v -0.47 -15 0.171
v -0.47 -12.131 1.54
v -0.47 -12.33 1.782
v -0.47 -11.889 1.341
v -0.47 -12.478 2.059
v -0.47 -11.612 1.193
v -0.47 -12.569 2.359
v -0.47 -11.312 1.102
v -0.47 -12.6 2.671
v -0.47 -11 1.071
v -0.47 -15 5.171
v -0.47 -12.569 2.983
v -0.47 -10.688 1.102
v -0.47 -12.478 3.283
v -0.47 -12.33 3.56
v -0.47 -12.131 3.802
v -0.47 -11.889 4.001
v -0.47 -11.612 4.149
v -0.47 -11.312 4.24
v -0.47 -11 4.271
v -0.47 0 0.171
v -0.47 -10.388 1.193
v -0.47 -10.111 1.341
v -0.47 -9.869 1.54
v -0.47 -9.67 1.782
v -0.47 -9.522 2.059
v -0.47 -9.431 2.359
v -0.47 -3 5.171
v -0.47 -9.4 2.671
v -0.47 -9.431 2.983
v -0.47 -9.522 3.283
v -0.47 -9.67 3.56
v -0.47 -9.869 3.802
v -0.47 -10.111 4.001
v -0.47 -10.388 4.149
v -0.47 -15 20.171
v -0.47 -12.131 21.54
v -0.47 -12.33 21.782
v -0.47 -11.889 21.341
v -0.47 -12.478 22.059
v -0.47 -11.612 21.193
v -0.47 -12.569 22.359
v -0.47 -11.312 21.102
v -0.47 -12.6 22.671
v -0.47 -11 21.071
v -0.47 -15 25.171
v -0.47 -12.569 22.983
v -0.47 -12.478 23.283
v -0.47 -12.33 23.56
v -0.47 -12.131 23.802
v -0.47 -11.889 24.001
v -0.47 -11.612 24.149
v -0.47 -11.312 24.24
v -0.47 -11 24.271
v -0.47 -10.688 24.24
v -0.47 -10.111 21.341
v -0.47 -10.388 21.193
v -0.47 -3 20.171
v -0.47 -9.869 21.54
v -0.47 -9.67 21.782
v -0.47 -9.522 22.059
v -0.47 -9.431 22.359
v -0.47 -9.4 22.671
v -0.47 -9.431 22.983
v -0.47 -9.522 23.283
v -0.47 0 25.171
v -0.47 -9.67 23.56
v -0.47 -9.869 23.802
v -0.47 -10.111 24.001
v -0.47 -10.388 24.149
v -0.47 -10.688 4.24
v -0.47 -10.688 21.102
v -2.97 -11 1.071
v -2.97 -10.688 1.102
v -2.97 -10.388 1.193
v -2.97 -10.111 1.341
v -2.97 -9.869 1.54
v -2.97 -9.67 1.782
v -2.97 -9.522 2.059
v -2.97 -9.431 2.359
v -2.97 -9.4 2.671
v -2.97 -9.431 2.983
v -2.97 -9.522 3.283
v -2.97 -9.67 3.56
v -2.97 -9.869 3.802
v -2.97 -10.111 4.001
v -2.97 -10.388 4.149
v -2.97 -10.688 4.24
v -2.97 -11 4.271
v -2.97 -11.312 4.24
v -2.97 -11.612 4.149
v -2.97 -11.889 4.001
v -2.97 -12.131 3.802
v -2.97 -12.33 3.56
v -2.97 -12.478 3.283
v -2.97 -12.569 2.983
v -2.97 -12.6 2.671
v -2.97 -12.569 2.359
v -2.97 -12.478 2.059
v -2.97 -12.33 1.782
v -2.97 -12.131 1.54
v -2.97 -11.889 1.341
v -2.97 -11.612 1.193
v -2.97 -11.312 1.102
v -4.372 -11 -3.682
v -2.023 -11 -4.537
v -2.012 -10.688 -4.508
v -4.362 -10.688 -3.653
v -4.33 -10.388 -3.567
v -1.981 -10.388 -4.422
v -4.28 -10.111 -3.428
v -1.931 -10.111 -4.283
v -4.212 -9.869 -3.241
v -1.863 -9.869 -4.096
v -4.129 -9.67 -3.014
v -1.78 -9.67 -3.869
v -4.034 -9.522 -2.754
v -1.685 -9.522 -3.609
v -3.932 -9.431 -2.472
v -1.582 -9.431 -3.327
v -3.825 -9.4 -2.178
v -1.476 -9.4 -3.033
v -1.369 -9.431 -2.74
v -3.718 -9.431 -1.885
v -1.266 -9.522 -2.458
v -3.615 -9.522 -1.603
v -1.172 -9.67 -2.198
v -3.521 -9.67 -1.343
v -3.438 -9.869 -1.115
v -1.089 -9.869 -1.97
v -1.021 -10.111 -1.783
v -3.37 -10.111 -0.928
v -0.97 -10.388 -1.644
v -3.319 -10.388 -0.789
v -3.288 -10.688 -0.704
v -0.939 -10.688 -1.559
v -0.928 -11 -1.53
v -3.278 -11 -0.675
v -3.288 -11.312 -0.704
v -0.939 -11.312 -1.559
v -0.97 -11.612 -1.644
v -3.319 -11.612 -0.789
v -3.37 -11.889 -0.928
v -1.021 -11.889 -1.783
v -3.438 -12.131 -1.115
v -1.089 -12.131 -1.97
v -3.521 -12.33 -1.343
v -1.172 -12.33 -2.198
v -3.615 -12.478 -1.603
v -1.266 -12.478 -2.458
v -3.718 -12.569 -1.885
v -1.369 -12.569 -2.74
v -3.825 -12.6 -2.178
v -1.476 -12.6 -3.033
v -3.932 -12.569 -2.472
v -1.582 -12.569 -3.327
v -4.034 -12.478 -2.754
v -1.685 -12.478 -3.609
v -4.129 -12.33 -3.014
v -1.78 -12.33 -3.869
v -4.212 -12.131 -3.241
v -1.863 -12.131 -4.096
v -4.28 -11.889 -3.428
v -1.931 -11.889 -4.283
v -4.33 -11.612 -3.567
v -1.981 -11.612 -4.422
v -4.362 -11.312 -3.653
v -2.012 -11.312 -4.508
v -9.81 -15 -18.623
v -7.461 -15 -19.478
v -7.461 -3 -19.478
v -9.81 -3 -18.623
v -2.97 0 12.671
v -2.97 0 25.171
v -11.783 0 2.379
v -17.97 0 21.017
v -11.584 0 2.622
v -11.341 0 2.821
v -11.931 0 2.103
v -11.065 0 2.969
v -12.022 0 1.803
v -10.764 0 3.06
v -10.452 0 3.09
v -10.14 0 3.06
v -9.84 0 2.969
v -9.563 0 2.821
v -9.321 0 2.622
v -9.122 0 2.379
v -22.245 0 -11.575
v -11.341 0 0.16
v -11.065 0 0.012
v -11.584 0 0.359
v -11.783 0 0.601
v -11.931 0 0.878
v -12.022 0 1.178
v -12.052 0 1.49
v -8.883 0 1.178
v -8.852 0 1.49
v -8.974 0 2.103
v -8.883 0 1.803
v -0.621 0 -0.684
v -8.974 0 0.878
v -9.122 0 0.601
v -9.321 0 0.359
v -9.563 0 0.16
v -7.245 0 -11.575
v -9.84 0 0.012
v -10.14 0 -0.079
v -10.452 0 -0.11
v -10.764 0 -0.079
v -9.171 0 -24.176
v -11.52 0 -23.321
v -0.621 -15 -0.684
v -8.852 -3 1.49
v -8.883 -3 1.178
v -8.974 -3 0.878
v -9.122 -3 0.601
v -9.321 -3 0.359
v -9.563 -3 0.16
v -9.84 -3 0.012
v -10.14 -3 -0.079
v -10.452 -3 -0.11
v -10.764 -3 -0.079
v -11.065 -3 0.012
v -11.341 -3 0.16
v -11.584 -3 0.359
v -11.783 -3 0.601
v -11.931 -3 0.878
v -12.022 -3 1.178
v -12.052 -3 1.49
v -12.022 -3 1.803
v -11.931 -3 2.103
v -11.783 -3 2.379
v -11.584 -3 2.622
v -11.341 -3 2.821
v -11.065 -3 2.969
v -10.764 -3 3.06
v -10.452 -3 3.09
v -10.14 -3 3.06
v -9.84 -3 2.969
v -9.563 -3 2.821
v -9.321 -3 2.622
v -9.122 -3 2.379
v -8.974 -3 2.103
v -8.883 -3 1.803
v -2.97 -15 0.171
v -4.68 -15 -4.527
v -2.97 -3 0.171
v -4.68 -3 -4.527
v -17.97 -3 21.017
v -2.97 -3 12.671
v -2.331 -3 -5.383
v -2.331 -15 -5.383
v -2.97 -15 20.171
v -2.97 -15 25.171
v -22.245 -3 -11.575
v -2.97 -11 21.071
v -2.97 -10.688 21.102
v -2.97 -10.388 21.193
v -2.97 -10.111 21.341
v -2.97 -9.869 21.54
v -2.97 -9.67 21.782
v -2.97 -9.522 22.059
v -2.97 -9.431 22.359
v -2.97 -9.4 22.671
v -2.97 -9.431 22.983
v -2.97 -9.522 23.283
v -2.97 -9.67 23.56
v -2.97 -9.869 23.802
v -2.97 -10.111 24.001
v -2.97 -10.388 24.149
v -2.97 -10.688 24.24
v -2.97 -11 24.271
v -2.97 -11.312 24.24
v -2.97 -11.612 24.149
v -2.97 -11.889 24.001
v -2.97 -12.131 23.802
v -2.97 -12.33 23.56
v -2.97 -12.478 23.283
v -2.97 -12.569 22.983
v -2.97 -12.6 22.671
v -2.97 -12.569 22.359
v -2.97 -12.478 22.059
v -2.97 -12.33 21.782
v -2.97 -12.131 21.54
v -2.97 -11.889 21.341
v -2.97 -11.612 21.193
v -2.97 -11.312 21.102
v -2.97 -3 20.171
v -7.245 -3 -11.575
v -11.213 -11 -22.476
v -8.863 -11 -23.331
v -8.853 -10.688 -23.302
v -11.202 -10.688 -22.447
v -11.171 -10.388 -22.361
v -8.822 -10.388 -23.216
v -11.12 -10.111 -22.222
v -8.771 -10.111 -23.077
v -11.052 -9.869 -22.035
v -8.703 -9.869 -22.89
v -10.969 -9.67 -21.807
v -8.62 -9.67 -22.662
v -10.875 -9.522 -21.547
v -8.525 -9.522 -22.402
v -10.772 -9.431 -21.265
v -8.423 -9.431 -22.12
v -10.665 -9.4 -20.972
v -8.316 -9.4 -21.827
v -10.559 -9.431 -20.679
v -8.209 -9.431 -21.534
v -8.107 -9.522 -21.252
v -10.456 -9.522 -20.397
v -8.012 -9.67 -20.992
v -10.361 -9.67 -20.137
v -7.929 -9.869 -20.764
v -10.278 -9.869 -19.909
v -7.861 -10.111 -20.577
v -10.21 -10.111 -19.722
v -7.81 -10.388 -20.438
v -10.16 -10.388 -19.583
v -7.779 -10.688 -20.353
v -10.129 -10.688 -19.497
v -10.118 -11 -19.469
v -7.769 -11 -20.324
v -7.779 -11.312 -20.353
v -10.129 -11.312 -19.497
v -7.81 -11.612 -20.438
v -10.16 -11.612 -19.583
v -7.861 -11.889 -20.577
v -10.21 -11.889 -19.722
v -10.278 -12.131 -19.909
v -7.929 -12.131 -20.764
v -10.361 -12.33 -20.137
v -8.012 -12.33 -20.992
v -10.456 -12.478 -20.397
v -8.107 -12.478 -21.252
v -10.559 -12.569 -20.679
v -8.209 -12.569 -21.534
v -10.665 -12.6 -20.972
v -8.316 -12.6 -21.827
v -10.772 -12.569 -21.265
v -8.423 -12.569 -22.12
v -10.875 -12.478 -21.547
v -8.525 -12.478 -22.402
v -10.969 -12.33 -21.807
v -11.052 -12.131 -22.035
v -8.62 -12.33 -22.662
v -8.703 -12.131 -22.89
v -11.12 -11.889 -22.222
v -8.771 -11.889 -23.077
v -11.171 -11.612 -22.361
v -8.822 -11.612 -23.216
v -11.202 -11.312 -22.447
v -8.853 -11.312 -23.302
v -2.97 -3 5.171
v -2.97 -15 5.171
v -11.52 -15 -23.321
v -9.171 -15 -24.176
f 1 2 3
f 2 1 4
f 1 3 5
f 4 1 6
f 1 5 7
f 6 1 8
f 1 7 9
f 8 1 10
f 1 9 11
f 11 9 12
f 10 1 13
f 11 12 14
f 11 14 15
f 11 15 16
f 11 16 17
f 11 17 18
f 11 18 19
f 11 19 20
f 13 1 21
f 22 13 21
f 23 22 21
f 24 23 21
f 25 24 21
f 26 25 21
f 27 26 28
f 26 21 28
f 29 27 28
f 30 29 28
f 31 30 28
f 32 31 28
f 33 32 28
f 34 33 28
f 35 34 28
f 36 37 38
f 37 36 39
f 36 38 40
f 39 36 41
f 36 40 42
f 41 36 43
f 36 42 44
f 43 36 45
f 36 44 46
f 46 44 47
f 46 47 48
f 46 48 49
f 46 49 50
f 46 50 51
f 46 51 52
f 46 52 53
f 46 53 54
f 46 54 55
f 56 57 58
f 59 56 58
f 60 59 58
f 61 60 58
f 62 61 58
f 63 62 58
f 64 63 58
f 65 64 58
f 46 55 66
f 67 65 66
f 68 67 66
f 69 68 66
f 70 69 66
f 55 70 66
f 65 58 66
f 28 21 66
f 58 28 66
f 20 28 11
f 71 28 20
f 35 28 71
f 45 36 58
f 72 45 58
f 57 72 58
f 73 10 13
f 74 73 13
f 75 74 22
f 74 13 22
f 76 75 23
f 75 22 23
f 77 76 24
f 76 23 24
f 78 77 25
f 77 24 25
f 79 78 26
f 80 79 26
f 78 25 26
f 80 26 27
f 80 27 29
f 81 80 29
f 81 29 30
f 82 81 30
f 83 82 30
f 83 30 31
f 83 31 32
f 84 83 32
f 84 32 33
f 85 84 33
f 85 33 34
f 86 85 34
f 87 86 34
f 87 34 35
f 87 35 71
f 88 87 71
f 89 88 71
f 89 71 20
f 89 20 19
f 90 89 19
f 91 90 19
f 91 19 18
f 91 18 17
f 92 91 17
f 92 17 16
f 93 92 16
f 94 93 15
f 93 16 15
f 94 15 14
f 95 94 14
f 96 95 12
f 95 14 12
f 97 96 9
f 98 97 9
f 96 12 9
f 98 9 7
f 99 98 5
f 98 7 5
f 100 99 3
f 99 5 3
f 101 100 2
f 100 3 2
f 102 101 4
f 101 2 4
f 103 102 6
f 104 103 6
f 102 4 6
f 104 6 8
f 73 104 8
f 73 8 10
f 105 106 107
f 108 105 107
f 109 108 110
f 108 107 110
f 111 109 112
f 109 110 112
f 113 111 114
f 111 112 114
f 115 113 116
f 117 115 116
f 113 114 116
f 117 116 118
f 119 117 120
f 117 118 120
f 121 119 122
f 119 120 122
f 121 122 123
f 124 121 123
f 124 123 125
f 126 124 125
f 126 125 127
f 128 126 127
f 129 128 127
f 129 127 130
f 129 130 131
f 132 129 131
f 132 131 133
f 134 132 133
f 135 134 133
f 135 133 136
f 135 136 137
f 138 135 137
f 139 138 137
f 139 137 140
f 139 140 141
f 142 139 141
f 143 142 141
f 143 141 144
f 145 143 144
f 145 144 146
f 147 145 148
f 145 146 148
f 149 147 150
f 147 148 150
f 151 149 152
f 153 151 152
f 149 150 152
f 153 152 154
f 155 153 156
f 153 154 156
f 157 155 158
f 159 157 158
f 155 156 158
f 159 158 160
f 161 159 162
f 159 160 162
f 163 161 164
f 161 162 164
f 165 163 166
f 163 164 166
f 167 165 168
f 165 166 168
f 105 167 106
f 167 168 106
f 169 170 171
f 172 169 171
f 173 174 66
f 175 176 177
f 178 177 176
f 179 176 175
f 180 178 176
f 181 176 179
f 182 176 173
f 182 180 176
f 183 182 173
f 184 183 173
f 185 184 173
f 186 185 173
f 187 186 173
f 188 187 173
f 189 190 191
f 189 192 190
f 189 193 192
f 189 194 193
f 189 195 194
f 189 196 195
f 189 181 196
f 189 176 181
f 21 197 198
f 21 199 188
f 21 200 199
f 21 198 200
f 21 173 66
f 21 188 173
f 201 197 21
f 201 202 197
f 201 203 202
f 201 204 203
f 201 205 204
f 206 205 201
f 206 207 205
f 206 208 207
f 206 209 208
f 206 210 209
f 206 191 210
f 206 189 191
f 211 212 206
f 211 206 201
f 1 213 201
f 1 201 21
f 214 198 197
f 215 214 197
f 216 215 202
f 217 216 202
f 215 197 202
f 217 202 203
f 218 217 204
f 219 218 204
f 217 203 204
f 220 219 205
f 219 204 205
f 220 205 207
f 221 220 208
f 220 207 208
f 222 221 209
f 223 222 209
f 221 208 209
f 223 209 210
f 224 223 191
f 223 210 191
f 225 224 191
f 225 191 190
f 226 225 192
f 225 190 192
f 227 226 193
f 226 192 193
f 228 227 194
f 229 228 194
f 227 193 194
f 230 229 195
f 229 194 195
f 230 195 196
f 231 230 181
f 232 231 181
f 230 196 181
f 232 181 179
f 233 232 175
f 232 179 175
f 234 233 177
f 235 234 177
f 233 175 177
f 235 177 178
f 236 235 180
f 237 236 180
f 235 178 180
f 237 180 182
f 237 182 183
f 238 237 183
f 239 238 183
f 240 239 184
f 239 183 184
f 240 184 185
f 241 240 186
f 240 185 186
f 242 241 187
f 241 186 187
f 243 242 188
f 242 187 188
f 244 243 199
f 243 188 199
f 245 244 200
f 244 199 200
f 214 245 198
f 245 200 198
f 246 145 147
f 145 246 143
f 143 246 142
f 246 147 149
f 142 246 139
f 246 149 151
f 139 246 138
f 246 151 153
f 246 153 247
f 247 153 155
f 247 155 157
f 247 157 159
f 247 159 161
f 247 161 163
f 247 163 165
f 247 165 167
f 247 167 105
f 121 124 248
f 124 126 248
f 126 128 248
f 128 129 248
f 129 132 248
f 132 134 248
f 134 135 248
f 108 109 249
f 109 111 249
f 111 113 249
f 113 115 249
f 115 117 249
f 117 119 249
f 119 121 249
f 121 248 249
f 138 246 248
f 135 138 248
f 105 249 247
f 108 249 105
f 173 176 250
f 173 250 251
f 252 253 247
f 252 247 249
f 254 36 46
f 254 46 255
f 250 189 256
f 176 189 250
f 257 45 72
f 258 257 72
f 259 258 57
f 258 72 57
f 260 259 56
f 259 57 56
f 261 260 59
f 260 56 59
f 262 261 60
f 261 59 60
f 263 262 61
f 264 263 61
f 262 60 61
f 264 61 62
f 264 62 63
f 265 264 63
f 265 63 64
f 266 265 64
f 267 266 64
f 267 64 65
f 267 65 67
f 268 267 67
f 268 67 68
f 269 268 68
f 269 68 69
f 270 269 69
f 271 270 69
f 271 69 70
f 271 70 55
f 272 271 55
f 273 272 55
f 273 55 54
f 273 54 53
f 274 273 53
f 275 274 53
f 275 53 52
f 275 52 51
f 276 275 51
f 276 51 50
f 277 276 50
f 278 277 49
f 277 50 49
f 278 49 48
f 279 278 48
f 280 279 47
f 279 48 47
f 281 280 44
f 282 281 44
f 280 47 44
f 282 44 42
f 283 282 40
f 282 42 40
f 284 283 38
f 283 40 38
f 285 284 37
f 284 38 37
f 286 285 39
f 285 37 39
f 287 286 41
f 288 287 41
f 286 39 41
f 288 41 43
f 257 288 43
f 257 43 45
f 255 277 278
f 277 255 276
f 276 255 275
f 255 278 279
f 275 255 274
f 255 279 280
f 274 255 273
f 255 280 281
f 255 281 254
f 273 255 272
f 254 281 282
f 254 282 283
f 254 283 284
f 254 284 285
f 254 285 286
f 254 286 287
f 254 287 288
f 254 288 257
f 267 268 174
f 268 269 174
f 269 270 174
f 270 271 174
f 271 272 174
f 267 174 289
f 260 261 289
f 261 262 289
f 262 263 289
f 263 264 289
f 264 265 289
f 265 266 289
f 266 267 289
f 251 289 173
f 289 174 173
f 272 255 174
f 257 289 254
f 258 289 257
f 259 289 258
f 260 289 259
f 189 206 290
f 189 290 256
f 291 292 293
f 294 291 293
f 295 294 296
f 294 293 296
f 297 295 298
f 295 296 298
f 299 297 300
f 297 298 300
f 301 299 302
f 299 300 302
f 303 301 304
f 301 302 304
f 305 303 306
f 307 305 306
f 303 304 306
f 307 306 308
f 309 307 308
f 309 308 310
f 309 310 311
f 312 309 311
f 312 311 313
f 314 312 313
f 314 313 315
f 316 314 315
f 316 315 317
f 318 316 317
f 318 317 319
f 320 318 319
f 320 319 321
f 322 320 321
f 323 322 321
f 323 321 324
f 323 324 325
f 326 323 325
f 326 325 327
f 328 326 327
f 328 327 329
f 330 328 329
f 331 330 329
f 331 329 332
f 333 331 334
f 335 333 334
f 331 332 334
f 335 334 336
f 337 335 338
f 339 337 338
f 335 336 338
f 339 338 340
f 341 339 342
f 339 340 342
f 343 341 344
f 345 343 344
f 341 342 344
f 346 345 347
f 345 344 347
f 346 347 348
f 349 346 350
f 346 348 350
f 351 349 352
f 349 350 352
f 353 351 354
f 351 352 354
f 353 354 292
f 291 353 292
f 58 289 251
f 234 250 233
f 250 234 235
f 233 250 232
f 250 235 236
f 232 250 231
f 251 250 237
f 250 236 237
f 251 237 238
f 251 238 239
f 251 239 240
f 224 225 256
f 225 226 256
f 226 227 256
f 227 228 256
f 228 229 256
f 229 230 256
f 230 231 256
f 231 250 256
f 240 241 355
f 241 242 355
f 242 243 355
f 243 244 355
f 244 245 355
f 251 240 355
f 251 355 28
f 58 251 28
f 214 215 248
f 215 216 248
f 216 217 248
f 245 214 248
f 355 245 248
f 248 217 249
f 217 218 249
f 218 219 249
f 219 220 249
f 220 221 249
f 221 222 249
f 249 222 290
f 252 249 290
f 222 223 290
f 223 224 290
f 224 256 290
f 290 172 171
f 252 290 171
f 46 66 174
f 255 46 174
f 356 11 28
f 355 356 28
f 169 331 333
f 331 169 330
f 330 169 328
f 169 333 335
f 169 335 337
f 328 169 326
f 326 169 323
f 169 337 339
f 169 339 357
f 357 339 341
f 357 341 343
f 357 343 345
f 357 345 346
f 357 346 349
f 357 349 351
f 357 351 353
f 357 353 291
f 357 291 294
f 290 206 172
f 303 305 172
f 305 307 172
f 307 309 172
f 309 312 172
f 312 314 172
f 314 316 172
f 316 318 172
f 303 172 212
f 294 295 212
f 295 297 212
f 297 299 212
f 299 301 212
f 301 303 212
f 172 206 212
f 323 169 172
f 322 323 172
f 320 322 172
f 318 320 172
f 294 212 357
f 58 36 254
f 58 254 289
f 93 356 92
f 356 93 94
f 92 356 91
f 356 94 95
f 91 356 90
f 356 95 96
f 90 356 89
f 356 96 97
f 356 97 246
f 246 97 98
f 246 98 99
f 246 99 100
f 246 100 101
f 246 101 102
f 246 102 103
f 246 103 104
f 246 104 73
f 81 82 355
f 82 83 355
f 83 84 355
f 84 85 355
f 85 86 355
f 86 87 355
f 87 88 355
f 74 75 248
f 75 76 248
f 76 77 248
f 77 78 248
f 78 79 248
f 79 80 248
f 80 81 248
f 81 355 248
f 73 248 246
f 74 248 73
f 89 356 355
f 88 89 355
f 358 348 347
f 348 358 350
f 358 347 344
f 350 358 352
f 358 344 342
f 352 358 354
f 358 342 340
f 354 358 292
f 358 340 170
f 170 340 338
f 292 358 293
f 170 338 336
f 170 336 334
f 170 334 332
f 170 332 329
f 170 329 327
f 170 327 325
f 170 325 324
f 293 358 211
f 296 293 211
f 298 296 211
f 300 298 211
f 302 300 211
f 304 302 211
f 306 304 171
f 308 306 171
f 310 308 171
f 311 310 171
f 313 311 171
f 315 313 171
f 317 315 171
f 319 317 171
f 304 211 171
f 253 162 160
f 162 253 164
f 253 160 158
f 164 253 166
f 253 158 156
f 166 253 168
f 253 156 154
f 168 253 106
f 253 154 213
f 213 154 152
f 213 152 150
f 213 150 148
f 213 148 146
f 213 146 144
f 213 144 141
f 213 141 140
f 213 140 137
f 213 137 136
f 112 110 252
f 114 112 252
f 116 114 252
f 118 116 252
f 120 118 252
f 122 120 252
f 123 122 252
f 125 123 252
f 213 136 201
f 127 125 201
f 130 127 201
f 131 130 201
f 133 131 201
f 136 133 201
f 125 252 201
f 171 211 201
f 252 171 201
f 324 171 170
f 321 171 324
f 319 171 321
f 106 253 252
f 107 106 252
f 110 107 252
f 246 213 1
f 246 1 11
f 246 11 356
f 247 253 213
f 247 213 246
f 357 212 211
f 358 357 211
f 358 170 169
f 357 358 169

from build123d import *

# Parameters (mm, degrees)
BOSS_EXTRUDE1_DEPTH = 15
SKETCH5_R           = 1.6
SKETCH5_W           = 15
SKETCH5_H           = 12
CUT_EXTRUDE4_DEPTH  = 15
SKETCH8_R           = 1.6
SKETCH8_W           = 15
SKETCH8_H           = 12.119225193
CUT_EXTRUDE5_DEPTH  = 15
SKETCH6_R           = 1.6
BOSS_EXTRUDE8_DEPTH = 3


with BuildPart() as part:
    # Sketch1 → Boss-Extrude1 (new body)
    with BuildSketch(Plane(origin=(0, 0, 0), x_dir=(1, 0, 0), z_dir=(0, 1, 0))):
        Polygon((-0.46984631, -0.171010072), (-0.46984631, -25.171010072), (-2.96984631, -25.171010072), (-2.96984631, -0.171010072), (-11.520349894, 23.321305448), (-9.171118342, 24.176355806), (-0.620614758, 0.684040287), align=None)
    extrude(amount=-BOSS_EXTRUDE1_DEPTH)

    # Sketch5 → Cut-Extrude4 (cut)
    with BuildSketch(Plane(origin=(-0.46984631, 0, 0), x_dir=(0, 0, -1), z_dir=(1, 0, 0))):
        with Locations((-22.671010072, -11)):
            Circle(SKETCH5_R)
        with Locations((-2.671010072, -11)):
            Circle(SKETCH5_R)
        with Locations((-12.671010072, -9)):
            Rectangle(SKETCH5_W, SKETCH5_H)
    extrude(amount=-CUT_EXTRUDE4_DEPTH, mode=Mode.SUBTRACT)

    # Sketch8 → Cut-Extrude5 (cut)
    with BuildSketch(Plane(origin=(-0.328170312, 0, 0.119444225), x_dir=(-0.342020143, 0, -0.939692621), z_dir=(0.939692621, 0, -0.342020143))):
        with Locations((3.355050358, -11)):
            Circle(SKETCH8_R)
        with Locations((23.355050358, -11)):
            Circle(SKETCH8_R)
        with Locations((13.355050358, -9.059612596)):
            Rectangle(SKETCH8_W, SKETCH8_H)
    extrude(amount=-CUT_EXTRUDE5_DEPTH, mode=Mode.SUBTRACT)

    # Sketch6 → Boss-Extrude8 (add)
    with BuildSketch(Plane(origin=(0, 0, 0), x_dir=(1, 0, 0), z_dir=(0, 1, 0))):
        Polygon((-7.245098102, 11.575147688), (-22.245098102, 11.575147688), (-17.96984631, -21.01652559), (-2.96984631, -12.671010072), (-0.46984631, -0.171010072), (-0.620614758, 0.684040287), align=None)
        with Locations((-10.452336242, -1.490374929)):
            Circle(SKETCH6_R, mode=Mode.SUBTRACT)
    extrude(amount=-BOSS_EXTRUDE8_DEPTH)


solid = part.part
